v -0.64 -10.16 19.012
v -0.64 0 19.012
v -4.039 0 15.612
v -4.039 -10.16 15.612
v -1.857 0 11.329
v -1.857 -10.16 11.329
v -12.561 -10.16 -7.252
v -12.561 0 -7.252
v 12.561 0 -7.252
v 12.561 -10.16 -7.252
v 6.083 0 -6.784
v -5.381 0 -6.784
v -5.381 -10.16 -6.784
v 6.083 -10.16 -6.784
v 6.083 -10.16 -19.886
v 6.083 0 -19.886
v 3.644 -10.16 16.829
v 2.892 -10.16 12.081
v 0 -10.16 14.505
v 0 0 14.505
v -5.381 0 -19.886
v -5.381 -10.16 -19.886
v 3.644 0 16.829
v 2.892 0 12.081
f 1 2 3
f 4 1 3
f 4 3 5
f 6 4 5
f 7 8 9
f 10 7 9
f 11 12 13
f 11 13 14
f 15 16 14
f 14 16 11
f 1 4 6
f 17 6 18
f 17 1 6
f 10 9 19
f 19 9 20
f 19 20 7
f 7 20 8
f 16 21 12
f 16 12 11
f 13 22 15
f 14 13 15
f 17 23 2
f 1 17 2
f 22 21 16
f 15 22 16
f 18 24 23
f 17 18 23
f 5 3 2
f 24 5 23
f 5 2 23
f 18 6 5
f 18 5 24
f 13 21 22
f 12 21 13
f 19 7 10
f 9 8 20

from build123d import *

# Parameters (mm, degrees)
F1_W     = 11.4634186029
F1_H     = 13.1010534242
F3_DEPTH = 10.16


with BuildPart() as f3:
    # F1 (on Front) → F3 (new body)
    with BuildSketch(Plane.XZ):
        with Locations((0.3509214148, -13.3350002579)):
            Rectangle(F1_W, F1_H)
    extrude(amount=F3_DEPTH)


with BuildPart() as f3b:
    # F2 (on Front) → F3, piece 2 (new body)
    with BuildSketch(Plane.XZ):
        Polygon((-0.6397442972, 19.0118313535), (-4.0391988973, 15.6123801366), (-1.8566179087, 11.3288184898), (2.8917459256, 12.080883016), (3.6438151775, 16.8292461018), align=None)
    extrude(amount=F3_DEPTH)


with BuildPart() as f3c:
    # F0 (on Front) → F3, piece 3 (new body)
    with BuildSketch(Plane.XZ):
        Polygon((-12.5614701018, -7.2523681447), (12.5614701018, -7.2523681447), (0, 14.5047362894), align=None)
    extrude(amount=F3_DEPTH)


solid = Compound([f3.part, f3b.part, f3c.part])
